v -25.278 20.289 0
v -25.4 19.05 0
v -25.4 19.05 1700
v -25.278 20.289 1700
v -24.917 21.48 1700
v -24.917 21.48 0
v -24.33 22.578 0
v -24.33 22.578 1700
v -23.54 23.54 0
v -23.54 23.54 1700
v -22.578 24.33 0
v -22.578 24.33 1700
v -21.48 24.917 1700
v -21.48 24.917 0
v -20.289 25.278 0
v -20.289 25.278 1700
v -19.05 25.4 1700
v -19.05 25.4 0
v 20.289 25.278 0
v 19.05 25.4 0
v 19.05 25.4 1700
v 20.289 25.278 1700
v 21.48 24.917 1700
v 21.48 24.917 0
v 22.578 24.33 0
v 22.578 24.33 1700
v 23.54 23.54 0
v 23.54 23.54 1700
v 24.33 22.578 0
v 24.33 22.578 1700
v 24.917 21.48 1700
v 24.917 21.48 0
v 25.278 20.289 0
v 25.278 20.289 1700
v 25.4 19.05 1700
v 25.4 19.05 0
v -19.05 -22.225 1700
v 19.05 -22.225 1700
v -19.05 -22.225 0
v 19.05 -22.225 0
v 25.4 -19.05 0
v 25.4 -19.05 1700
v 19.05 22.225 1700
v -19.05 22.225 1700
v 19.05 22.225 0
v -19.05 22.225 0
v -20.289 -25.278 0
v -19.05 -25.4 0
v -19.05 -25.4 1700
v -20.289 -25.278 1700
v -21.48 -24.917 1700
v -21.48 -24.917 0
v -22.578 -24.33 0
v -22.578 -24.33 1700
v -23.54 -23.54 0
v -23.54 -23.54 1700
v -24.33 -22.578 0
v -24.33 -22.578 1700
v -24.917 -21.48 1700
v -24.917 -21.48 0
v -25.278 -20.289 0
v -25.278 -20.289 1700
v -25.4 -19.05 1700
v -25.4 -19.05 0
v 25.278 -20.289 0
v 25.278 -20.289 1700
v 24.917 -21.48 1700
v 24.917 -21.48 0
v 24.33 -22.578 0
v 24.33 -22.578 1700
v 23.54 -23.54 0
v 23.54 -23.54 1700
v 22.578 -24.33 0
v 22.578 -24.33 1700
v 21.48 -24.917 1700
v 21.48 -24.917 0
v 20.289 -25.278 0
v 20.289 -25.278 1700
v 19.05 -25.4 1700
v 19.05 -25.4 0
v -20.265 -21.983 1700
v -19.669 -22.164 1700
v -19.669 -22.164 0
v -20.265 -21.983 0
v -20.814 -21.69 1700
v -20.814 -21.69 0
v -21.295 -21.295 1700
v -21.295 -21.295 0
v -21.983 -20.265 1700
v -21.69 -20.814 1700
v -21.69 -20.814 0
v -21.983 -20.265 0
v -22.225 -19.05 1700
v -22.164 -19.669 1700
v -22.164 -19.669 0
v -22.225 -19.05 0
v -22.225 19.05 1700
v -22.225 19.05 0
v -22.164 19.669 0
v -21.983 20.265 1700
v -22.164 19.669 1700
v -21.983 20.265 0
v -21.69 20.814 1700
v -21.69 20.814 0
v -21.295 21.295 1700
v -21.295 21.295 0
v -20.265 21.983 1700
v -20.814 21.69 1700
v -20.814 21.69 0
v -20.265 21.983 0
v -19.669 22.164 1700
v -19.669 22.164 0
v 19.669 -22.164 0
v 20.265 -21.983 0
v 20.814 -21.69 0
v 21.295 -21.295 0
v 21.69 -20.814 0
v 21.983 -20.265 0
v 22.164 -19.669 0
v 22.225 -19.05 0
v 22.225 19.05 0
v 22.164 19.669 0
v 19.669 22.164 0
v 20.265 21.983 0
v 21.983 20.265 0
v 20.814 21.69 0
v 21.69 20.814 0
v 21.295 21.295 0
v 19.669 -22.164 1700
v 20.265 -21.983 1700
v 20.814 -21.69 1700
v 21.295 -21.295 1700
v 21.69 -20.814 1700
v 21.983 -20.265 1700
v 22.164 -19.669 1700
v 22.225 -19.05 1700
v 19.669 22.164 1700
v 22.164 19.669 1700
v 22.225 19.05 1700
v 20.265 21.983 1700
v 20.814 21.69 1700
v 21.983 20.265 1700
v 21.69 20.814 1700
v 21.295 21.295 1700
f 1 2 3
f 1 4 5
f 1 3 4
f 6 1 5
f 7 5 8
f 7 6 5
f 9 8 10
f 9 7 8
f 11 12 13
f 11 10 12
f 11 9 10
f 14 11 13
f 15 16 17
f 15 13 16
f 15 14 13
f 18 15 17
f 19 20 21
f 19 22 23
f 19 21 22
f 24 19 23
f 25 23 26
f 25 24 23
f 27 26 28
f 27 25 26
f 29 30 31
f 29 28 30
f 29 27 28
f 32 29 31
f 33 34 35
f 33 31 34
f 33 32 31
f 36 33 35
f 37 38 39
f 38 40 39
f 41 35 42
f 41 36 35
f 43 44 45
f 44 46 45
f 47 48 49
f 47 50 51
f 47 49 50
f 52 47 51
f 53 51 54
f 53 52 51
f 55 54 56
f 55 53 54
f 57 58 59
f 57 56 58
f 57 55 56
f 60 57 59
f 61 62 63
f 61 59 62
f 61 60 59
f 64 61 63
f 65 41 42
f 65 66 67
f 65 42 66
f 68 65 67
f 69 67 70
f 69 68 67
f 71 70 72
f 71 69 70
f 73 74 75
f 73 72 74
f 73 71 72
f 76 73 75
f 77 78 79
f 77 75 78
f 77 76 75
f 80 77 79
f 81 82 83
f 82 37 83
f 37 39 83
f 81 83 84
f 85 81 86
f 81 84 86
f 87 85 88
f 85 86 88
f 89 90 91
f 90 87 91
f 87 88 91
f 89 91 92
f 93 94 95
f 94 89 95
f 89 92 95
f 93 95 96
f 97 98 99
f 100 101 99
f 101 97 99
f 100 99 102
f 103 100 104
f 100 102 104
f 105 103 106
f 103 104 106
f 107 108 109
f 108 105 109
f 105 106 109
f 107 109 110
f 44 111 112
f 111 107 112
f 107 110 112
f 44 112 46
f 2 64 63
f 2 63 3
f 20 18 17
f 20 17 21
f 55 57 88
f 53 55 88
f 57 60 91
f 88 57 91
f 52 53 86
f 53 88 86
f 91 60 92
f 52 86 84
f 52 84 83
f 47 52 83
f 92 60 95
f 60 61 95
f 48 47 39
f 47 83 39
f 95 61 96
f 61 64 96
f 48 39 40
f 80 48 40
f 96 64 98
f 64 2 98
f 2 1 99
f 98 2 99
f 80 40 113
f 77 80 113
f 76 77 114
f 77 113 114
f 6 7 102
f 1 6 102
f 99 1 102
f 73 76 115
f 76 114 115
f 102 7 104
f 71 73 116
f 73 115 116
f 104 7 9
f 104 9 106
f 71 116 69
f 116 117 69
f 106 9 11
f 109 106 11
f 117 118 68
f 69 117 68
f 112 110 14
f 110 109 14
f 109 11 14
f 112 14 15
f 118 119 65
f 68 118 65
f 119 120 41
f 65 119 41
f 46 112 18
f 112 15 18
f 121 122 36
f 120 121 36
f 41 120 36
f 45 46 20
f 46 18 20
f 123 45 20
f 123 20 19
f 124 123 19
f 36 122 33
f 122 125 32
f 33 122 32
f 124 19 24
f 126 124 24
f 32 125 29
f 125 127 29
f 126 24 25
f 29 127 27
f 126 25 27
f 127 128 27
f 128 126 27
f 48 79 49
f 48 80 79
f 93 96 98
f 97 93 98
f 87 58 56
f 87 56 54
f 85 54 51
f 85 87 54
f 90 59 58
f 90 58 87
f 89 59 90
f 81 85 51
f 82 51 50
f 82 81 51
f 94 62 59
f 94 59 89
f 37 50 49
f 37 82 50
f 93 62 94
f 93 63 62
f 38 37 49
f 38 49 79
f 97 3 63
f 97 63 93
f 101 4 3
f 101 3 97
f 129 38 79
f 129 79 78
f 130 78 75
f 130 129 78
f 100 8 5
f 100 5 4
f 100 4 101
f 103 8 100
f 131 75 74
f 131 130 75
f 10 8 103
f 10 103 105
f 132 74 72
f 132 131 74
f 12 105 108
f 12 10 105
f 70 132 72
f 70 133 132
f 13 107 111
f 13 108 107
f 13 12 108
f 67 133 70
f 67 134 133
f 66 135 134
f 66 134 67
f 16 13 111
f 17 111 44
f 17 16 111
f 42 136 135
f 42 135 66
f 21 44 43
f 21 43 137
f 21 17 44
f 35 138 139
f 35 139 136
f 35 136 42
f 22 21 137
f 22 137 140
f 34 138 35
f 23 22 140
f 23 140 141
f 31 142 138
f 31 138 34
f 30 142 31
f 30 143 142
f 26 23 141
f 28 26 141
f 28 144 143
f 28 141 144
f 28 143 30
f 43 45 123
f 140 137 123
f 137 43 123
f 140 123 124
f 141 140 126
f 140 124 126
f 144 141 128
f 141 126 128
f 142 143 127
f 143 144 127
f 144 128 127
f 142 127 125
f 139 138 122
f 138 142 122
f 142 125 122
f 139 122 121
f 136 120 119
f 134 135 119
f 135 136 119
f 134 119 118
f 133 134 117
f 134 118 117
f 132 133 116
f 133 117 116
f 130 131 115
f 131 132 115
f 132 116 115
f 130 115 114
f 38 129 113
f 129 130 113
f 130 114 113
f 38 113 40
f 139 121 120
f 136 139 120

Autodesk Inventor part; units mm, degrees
ref_plane "YZ Plane" through (0, 0, 0) normal (1, 0, 0) x (0, 1, 0)
ref_plane "Plano inicial" through (0, 0, 0) normal (0, 0, 1) x (1, 0, 0)
ref_plane "Plano final" through (0, 0, 1700) normal (0, 0, 1) x (1, 0, 0)
sketch "Boceto" plane through (0, 0, 0) normal (0, 0, 1) x (1, 0, 0)
  line L0 (-25.4, -19.05) -> (-25.4, 19.05)
  line L1 (-19.05, 25.4) -> (19.05, 25.4)
  line L2 (25.4, 19.05) -> (25.4, -19.05)
  line L3 (19.05, -25.4) -> (-19.05, -25.4)
  arc A0 (-25.4, -19.05) -> (-19.05, -25.4) centre (-19.05, -19.05) ccw
  arc A1 (-19.05, 25.4) -> (-25.4, 19.05) centre (-19.05, 19.05) ccw
  arc A2 (25.4, 19.05) -> (19.05, 25.4) centre (19.05, 19.05) ccw
  arc A3 (19.05, -25.4) -> (25.4, -19.05) centre (19.05, -19.05) ccw
  arc A4 (-19.05, 22.225) -> (-22.225, 19.05) centre (-19.05, 19.05) ccw
  line L4 (-19.05, 22.225) -> (19.05, 22.225)
  arc A5 (22.225, 19.05) -> (19.05, 22.225) centre (19.05, 19.05) ccw
  line L5 (22.225, 19.05) -> (22.225, -19.05)
  arc A6 (19.05, -22.225) -> (22.225, -19.05) centre (19.05, -19.05) ccw
  line L6 (19.05, -22.225) -> (-19.05, -22.225)
  arc A7 (-22.225, -19.05) -> (-19.05, -22.225) centre (-19.05, -19.05) ccw
  line L7 (-22.225, -19.05) -> (-22.225, 19.05)
  line L8 (0, 37.4012) -> (0, -37.4012) construction
  line L9 (-37.4012, 0) -> (37.4012, 0) construction
  dimension "d10" = 50.8
  dimension "d11" = 50.8
  dimension "d12" = 3.175
  dimension "d15" = 25.4
  dimension "d16" = 25.4
  dimension "d17" = 6.35
extrude "Cuerpo" add sketch "Boceto" along normal up to surface (1700 mm away) from surface at 0
sketch "Sketch3" plane through (0, 0, 0) normal (0, 0, 1) x (1, 0, 0)
  line L0 (0, 0) -> (10, 0)
ref_plane "Work Plane3" through (0, 0, 0) normal (0, -1, 0) x (1, 0, 0)
sketch "Sketch4" plane through (0, 0, 0) normal (0, -1, 0) x (1, 0, 0)
  line L0 (-2, 0) -> (12, 0) projected
  line L1 (-2, 1700) -> (12, 1700) projected
  dimension "d19" = 1700
equation "\"d10\" = G_H"
equation "\"d11\" = G_W"
equation "\"d12\" = G_T"
equation "\"d15\" = 0.5 * d10"
equation "\"d16\" = 0.5 * d11"
equation "\"d17\" = G_IR"
equation "\"d3\" = G_L"
equation "\"G_W\" = 50.8"
equation "\"G_H\" = 50.8"
equation "\"G_T\" = 3.175"
equation "\"G_IR\" = 6.35"
equation "\"G_L\" = d19"
equation "\"G_OFFSET_START\" = 0"
equation "\"G_OFFSET_END\" = 0"
equation "\"d14\" = G_OFFSET_END + B_L"
equation "\"B_L\" = 1700"
properties part number "AISC - 2 x 2 x 1/8 - 66,929" material "Acero, suave"
